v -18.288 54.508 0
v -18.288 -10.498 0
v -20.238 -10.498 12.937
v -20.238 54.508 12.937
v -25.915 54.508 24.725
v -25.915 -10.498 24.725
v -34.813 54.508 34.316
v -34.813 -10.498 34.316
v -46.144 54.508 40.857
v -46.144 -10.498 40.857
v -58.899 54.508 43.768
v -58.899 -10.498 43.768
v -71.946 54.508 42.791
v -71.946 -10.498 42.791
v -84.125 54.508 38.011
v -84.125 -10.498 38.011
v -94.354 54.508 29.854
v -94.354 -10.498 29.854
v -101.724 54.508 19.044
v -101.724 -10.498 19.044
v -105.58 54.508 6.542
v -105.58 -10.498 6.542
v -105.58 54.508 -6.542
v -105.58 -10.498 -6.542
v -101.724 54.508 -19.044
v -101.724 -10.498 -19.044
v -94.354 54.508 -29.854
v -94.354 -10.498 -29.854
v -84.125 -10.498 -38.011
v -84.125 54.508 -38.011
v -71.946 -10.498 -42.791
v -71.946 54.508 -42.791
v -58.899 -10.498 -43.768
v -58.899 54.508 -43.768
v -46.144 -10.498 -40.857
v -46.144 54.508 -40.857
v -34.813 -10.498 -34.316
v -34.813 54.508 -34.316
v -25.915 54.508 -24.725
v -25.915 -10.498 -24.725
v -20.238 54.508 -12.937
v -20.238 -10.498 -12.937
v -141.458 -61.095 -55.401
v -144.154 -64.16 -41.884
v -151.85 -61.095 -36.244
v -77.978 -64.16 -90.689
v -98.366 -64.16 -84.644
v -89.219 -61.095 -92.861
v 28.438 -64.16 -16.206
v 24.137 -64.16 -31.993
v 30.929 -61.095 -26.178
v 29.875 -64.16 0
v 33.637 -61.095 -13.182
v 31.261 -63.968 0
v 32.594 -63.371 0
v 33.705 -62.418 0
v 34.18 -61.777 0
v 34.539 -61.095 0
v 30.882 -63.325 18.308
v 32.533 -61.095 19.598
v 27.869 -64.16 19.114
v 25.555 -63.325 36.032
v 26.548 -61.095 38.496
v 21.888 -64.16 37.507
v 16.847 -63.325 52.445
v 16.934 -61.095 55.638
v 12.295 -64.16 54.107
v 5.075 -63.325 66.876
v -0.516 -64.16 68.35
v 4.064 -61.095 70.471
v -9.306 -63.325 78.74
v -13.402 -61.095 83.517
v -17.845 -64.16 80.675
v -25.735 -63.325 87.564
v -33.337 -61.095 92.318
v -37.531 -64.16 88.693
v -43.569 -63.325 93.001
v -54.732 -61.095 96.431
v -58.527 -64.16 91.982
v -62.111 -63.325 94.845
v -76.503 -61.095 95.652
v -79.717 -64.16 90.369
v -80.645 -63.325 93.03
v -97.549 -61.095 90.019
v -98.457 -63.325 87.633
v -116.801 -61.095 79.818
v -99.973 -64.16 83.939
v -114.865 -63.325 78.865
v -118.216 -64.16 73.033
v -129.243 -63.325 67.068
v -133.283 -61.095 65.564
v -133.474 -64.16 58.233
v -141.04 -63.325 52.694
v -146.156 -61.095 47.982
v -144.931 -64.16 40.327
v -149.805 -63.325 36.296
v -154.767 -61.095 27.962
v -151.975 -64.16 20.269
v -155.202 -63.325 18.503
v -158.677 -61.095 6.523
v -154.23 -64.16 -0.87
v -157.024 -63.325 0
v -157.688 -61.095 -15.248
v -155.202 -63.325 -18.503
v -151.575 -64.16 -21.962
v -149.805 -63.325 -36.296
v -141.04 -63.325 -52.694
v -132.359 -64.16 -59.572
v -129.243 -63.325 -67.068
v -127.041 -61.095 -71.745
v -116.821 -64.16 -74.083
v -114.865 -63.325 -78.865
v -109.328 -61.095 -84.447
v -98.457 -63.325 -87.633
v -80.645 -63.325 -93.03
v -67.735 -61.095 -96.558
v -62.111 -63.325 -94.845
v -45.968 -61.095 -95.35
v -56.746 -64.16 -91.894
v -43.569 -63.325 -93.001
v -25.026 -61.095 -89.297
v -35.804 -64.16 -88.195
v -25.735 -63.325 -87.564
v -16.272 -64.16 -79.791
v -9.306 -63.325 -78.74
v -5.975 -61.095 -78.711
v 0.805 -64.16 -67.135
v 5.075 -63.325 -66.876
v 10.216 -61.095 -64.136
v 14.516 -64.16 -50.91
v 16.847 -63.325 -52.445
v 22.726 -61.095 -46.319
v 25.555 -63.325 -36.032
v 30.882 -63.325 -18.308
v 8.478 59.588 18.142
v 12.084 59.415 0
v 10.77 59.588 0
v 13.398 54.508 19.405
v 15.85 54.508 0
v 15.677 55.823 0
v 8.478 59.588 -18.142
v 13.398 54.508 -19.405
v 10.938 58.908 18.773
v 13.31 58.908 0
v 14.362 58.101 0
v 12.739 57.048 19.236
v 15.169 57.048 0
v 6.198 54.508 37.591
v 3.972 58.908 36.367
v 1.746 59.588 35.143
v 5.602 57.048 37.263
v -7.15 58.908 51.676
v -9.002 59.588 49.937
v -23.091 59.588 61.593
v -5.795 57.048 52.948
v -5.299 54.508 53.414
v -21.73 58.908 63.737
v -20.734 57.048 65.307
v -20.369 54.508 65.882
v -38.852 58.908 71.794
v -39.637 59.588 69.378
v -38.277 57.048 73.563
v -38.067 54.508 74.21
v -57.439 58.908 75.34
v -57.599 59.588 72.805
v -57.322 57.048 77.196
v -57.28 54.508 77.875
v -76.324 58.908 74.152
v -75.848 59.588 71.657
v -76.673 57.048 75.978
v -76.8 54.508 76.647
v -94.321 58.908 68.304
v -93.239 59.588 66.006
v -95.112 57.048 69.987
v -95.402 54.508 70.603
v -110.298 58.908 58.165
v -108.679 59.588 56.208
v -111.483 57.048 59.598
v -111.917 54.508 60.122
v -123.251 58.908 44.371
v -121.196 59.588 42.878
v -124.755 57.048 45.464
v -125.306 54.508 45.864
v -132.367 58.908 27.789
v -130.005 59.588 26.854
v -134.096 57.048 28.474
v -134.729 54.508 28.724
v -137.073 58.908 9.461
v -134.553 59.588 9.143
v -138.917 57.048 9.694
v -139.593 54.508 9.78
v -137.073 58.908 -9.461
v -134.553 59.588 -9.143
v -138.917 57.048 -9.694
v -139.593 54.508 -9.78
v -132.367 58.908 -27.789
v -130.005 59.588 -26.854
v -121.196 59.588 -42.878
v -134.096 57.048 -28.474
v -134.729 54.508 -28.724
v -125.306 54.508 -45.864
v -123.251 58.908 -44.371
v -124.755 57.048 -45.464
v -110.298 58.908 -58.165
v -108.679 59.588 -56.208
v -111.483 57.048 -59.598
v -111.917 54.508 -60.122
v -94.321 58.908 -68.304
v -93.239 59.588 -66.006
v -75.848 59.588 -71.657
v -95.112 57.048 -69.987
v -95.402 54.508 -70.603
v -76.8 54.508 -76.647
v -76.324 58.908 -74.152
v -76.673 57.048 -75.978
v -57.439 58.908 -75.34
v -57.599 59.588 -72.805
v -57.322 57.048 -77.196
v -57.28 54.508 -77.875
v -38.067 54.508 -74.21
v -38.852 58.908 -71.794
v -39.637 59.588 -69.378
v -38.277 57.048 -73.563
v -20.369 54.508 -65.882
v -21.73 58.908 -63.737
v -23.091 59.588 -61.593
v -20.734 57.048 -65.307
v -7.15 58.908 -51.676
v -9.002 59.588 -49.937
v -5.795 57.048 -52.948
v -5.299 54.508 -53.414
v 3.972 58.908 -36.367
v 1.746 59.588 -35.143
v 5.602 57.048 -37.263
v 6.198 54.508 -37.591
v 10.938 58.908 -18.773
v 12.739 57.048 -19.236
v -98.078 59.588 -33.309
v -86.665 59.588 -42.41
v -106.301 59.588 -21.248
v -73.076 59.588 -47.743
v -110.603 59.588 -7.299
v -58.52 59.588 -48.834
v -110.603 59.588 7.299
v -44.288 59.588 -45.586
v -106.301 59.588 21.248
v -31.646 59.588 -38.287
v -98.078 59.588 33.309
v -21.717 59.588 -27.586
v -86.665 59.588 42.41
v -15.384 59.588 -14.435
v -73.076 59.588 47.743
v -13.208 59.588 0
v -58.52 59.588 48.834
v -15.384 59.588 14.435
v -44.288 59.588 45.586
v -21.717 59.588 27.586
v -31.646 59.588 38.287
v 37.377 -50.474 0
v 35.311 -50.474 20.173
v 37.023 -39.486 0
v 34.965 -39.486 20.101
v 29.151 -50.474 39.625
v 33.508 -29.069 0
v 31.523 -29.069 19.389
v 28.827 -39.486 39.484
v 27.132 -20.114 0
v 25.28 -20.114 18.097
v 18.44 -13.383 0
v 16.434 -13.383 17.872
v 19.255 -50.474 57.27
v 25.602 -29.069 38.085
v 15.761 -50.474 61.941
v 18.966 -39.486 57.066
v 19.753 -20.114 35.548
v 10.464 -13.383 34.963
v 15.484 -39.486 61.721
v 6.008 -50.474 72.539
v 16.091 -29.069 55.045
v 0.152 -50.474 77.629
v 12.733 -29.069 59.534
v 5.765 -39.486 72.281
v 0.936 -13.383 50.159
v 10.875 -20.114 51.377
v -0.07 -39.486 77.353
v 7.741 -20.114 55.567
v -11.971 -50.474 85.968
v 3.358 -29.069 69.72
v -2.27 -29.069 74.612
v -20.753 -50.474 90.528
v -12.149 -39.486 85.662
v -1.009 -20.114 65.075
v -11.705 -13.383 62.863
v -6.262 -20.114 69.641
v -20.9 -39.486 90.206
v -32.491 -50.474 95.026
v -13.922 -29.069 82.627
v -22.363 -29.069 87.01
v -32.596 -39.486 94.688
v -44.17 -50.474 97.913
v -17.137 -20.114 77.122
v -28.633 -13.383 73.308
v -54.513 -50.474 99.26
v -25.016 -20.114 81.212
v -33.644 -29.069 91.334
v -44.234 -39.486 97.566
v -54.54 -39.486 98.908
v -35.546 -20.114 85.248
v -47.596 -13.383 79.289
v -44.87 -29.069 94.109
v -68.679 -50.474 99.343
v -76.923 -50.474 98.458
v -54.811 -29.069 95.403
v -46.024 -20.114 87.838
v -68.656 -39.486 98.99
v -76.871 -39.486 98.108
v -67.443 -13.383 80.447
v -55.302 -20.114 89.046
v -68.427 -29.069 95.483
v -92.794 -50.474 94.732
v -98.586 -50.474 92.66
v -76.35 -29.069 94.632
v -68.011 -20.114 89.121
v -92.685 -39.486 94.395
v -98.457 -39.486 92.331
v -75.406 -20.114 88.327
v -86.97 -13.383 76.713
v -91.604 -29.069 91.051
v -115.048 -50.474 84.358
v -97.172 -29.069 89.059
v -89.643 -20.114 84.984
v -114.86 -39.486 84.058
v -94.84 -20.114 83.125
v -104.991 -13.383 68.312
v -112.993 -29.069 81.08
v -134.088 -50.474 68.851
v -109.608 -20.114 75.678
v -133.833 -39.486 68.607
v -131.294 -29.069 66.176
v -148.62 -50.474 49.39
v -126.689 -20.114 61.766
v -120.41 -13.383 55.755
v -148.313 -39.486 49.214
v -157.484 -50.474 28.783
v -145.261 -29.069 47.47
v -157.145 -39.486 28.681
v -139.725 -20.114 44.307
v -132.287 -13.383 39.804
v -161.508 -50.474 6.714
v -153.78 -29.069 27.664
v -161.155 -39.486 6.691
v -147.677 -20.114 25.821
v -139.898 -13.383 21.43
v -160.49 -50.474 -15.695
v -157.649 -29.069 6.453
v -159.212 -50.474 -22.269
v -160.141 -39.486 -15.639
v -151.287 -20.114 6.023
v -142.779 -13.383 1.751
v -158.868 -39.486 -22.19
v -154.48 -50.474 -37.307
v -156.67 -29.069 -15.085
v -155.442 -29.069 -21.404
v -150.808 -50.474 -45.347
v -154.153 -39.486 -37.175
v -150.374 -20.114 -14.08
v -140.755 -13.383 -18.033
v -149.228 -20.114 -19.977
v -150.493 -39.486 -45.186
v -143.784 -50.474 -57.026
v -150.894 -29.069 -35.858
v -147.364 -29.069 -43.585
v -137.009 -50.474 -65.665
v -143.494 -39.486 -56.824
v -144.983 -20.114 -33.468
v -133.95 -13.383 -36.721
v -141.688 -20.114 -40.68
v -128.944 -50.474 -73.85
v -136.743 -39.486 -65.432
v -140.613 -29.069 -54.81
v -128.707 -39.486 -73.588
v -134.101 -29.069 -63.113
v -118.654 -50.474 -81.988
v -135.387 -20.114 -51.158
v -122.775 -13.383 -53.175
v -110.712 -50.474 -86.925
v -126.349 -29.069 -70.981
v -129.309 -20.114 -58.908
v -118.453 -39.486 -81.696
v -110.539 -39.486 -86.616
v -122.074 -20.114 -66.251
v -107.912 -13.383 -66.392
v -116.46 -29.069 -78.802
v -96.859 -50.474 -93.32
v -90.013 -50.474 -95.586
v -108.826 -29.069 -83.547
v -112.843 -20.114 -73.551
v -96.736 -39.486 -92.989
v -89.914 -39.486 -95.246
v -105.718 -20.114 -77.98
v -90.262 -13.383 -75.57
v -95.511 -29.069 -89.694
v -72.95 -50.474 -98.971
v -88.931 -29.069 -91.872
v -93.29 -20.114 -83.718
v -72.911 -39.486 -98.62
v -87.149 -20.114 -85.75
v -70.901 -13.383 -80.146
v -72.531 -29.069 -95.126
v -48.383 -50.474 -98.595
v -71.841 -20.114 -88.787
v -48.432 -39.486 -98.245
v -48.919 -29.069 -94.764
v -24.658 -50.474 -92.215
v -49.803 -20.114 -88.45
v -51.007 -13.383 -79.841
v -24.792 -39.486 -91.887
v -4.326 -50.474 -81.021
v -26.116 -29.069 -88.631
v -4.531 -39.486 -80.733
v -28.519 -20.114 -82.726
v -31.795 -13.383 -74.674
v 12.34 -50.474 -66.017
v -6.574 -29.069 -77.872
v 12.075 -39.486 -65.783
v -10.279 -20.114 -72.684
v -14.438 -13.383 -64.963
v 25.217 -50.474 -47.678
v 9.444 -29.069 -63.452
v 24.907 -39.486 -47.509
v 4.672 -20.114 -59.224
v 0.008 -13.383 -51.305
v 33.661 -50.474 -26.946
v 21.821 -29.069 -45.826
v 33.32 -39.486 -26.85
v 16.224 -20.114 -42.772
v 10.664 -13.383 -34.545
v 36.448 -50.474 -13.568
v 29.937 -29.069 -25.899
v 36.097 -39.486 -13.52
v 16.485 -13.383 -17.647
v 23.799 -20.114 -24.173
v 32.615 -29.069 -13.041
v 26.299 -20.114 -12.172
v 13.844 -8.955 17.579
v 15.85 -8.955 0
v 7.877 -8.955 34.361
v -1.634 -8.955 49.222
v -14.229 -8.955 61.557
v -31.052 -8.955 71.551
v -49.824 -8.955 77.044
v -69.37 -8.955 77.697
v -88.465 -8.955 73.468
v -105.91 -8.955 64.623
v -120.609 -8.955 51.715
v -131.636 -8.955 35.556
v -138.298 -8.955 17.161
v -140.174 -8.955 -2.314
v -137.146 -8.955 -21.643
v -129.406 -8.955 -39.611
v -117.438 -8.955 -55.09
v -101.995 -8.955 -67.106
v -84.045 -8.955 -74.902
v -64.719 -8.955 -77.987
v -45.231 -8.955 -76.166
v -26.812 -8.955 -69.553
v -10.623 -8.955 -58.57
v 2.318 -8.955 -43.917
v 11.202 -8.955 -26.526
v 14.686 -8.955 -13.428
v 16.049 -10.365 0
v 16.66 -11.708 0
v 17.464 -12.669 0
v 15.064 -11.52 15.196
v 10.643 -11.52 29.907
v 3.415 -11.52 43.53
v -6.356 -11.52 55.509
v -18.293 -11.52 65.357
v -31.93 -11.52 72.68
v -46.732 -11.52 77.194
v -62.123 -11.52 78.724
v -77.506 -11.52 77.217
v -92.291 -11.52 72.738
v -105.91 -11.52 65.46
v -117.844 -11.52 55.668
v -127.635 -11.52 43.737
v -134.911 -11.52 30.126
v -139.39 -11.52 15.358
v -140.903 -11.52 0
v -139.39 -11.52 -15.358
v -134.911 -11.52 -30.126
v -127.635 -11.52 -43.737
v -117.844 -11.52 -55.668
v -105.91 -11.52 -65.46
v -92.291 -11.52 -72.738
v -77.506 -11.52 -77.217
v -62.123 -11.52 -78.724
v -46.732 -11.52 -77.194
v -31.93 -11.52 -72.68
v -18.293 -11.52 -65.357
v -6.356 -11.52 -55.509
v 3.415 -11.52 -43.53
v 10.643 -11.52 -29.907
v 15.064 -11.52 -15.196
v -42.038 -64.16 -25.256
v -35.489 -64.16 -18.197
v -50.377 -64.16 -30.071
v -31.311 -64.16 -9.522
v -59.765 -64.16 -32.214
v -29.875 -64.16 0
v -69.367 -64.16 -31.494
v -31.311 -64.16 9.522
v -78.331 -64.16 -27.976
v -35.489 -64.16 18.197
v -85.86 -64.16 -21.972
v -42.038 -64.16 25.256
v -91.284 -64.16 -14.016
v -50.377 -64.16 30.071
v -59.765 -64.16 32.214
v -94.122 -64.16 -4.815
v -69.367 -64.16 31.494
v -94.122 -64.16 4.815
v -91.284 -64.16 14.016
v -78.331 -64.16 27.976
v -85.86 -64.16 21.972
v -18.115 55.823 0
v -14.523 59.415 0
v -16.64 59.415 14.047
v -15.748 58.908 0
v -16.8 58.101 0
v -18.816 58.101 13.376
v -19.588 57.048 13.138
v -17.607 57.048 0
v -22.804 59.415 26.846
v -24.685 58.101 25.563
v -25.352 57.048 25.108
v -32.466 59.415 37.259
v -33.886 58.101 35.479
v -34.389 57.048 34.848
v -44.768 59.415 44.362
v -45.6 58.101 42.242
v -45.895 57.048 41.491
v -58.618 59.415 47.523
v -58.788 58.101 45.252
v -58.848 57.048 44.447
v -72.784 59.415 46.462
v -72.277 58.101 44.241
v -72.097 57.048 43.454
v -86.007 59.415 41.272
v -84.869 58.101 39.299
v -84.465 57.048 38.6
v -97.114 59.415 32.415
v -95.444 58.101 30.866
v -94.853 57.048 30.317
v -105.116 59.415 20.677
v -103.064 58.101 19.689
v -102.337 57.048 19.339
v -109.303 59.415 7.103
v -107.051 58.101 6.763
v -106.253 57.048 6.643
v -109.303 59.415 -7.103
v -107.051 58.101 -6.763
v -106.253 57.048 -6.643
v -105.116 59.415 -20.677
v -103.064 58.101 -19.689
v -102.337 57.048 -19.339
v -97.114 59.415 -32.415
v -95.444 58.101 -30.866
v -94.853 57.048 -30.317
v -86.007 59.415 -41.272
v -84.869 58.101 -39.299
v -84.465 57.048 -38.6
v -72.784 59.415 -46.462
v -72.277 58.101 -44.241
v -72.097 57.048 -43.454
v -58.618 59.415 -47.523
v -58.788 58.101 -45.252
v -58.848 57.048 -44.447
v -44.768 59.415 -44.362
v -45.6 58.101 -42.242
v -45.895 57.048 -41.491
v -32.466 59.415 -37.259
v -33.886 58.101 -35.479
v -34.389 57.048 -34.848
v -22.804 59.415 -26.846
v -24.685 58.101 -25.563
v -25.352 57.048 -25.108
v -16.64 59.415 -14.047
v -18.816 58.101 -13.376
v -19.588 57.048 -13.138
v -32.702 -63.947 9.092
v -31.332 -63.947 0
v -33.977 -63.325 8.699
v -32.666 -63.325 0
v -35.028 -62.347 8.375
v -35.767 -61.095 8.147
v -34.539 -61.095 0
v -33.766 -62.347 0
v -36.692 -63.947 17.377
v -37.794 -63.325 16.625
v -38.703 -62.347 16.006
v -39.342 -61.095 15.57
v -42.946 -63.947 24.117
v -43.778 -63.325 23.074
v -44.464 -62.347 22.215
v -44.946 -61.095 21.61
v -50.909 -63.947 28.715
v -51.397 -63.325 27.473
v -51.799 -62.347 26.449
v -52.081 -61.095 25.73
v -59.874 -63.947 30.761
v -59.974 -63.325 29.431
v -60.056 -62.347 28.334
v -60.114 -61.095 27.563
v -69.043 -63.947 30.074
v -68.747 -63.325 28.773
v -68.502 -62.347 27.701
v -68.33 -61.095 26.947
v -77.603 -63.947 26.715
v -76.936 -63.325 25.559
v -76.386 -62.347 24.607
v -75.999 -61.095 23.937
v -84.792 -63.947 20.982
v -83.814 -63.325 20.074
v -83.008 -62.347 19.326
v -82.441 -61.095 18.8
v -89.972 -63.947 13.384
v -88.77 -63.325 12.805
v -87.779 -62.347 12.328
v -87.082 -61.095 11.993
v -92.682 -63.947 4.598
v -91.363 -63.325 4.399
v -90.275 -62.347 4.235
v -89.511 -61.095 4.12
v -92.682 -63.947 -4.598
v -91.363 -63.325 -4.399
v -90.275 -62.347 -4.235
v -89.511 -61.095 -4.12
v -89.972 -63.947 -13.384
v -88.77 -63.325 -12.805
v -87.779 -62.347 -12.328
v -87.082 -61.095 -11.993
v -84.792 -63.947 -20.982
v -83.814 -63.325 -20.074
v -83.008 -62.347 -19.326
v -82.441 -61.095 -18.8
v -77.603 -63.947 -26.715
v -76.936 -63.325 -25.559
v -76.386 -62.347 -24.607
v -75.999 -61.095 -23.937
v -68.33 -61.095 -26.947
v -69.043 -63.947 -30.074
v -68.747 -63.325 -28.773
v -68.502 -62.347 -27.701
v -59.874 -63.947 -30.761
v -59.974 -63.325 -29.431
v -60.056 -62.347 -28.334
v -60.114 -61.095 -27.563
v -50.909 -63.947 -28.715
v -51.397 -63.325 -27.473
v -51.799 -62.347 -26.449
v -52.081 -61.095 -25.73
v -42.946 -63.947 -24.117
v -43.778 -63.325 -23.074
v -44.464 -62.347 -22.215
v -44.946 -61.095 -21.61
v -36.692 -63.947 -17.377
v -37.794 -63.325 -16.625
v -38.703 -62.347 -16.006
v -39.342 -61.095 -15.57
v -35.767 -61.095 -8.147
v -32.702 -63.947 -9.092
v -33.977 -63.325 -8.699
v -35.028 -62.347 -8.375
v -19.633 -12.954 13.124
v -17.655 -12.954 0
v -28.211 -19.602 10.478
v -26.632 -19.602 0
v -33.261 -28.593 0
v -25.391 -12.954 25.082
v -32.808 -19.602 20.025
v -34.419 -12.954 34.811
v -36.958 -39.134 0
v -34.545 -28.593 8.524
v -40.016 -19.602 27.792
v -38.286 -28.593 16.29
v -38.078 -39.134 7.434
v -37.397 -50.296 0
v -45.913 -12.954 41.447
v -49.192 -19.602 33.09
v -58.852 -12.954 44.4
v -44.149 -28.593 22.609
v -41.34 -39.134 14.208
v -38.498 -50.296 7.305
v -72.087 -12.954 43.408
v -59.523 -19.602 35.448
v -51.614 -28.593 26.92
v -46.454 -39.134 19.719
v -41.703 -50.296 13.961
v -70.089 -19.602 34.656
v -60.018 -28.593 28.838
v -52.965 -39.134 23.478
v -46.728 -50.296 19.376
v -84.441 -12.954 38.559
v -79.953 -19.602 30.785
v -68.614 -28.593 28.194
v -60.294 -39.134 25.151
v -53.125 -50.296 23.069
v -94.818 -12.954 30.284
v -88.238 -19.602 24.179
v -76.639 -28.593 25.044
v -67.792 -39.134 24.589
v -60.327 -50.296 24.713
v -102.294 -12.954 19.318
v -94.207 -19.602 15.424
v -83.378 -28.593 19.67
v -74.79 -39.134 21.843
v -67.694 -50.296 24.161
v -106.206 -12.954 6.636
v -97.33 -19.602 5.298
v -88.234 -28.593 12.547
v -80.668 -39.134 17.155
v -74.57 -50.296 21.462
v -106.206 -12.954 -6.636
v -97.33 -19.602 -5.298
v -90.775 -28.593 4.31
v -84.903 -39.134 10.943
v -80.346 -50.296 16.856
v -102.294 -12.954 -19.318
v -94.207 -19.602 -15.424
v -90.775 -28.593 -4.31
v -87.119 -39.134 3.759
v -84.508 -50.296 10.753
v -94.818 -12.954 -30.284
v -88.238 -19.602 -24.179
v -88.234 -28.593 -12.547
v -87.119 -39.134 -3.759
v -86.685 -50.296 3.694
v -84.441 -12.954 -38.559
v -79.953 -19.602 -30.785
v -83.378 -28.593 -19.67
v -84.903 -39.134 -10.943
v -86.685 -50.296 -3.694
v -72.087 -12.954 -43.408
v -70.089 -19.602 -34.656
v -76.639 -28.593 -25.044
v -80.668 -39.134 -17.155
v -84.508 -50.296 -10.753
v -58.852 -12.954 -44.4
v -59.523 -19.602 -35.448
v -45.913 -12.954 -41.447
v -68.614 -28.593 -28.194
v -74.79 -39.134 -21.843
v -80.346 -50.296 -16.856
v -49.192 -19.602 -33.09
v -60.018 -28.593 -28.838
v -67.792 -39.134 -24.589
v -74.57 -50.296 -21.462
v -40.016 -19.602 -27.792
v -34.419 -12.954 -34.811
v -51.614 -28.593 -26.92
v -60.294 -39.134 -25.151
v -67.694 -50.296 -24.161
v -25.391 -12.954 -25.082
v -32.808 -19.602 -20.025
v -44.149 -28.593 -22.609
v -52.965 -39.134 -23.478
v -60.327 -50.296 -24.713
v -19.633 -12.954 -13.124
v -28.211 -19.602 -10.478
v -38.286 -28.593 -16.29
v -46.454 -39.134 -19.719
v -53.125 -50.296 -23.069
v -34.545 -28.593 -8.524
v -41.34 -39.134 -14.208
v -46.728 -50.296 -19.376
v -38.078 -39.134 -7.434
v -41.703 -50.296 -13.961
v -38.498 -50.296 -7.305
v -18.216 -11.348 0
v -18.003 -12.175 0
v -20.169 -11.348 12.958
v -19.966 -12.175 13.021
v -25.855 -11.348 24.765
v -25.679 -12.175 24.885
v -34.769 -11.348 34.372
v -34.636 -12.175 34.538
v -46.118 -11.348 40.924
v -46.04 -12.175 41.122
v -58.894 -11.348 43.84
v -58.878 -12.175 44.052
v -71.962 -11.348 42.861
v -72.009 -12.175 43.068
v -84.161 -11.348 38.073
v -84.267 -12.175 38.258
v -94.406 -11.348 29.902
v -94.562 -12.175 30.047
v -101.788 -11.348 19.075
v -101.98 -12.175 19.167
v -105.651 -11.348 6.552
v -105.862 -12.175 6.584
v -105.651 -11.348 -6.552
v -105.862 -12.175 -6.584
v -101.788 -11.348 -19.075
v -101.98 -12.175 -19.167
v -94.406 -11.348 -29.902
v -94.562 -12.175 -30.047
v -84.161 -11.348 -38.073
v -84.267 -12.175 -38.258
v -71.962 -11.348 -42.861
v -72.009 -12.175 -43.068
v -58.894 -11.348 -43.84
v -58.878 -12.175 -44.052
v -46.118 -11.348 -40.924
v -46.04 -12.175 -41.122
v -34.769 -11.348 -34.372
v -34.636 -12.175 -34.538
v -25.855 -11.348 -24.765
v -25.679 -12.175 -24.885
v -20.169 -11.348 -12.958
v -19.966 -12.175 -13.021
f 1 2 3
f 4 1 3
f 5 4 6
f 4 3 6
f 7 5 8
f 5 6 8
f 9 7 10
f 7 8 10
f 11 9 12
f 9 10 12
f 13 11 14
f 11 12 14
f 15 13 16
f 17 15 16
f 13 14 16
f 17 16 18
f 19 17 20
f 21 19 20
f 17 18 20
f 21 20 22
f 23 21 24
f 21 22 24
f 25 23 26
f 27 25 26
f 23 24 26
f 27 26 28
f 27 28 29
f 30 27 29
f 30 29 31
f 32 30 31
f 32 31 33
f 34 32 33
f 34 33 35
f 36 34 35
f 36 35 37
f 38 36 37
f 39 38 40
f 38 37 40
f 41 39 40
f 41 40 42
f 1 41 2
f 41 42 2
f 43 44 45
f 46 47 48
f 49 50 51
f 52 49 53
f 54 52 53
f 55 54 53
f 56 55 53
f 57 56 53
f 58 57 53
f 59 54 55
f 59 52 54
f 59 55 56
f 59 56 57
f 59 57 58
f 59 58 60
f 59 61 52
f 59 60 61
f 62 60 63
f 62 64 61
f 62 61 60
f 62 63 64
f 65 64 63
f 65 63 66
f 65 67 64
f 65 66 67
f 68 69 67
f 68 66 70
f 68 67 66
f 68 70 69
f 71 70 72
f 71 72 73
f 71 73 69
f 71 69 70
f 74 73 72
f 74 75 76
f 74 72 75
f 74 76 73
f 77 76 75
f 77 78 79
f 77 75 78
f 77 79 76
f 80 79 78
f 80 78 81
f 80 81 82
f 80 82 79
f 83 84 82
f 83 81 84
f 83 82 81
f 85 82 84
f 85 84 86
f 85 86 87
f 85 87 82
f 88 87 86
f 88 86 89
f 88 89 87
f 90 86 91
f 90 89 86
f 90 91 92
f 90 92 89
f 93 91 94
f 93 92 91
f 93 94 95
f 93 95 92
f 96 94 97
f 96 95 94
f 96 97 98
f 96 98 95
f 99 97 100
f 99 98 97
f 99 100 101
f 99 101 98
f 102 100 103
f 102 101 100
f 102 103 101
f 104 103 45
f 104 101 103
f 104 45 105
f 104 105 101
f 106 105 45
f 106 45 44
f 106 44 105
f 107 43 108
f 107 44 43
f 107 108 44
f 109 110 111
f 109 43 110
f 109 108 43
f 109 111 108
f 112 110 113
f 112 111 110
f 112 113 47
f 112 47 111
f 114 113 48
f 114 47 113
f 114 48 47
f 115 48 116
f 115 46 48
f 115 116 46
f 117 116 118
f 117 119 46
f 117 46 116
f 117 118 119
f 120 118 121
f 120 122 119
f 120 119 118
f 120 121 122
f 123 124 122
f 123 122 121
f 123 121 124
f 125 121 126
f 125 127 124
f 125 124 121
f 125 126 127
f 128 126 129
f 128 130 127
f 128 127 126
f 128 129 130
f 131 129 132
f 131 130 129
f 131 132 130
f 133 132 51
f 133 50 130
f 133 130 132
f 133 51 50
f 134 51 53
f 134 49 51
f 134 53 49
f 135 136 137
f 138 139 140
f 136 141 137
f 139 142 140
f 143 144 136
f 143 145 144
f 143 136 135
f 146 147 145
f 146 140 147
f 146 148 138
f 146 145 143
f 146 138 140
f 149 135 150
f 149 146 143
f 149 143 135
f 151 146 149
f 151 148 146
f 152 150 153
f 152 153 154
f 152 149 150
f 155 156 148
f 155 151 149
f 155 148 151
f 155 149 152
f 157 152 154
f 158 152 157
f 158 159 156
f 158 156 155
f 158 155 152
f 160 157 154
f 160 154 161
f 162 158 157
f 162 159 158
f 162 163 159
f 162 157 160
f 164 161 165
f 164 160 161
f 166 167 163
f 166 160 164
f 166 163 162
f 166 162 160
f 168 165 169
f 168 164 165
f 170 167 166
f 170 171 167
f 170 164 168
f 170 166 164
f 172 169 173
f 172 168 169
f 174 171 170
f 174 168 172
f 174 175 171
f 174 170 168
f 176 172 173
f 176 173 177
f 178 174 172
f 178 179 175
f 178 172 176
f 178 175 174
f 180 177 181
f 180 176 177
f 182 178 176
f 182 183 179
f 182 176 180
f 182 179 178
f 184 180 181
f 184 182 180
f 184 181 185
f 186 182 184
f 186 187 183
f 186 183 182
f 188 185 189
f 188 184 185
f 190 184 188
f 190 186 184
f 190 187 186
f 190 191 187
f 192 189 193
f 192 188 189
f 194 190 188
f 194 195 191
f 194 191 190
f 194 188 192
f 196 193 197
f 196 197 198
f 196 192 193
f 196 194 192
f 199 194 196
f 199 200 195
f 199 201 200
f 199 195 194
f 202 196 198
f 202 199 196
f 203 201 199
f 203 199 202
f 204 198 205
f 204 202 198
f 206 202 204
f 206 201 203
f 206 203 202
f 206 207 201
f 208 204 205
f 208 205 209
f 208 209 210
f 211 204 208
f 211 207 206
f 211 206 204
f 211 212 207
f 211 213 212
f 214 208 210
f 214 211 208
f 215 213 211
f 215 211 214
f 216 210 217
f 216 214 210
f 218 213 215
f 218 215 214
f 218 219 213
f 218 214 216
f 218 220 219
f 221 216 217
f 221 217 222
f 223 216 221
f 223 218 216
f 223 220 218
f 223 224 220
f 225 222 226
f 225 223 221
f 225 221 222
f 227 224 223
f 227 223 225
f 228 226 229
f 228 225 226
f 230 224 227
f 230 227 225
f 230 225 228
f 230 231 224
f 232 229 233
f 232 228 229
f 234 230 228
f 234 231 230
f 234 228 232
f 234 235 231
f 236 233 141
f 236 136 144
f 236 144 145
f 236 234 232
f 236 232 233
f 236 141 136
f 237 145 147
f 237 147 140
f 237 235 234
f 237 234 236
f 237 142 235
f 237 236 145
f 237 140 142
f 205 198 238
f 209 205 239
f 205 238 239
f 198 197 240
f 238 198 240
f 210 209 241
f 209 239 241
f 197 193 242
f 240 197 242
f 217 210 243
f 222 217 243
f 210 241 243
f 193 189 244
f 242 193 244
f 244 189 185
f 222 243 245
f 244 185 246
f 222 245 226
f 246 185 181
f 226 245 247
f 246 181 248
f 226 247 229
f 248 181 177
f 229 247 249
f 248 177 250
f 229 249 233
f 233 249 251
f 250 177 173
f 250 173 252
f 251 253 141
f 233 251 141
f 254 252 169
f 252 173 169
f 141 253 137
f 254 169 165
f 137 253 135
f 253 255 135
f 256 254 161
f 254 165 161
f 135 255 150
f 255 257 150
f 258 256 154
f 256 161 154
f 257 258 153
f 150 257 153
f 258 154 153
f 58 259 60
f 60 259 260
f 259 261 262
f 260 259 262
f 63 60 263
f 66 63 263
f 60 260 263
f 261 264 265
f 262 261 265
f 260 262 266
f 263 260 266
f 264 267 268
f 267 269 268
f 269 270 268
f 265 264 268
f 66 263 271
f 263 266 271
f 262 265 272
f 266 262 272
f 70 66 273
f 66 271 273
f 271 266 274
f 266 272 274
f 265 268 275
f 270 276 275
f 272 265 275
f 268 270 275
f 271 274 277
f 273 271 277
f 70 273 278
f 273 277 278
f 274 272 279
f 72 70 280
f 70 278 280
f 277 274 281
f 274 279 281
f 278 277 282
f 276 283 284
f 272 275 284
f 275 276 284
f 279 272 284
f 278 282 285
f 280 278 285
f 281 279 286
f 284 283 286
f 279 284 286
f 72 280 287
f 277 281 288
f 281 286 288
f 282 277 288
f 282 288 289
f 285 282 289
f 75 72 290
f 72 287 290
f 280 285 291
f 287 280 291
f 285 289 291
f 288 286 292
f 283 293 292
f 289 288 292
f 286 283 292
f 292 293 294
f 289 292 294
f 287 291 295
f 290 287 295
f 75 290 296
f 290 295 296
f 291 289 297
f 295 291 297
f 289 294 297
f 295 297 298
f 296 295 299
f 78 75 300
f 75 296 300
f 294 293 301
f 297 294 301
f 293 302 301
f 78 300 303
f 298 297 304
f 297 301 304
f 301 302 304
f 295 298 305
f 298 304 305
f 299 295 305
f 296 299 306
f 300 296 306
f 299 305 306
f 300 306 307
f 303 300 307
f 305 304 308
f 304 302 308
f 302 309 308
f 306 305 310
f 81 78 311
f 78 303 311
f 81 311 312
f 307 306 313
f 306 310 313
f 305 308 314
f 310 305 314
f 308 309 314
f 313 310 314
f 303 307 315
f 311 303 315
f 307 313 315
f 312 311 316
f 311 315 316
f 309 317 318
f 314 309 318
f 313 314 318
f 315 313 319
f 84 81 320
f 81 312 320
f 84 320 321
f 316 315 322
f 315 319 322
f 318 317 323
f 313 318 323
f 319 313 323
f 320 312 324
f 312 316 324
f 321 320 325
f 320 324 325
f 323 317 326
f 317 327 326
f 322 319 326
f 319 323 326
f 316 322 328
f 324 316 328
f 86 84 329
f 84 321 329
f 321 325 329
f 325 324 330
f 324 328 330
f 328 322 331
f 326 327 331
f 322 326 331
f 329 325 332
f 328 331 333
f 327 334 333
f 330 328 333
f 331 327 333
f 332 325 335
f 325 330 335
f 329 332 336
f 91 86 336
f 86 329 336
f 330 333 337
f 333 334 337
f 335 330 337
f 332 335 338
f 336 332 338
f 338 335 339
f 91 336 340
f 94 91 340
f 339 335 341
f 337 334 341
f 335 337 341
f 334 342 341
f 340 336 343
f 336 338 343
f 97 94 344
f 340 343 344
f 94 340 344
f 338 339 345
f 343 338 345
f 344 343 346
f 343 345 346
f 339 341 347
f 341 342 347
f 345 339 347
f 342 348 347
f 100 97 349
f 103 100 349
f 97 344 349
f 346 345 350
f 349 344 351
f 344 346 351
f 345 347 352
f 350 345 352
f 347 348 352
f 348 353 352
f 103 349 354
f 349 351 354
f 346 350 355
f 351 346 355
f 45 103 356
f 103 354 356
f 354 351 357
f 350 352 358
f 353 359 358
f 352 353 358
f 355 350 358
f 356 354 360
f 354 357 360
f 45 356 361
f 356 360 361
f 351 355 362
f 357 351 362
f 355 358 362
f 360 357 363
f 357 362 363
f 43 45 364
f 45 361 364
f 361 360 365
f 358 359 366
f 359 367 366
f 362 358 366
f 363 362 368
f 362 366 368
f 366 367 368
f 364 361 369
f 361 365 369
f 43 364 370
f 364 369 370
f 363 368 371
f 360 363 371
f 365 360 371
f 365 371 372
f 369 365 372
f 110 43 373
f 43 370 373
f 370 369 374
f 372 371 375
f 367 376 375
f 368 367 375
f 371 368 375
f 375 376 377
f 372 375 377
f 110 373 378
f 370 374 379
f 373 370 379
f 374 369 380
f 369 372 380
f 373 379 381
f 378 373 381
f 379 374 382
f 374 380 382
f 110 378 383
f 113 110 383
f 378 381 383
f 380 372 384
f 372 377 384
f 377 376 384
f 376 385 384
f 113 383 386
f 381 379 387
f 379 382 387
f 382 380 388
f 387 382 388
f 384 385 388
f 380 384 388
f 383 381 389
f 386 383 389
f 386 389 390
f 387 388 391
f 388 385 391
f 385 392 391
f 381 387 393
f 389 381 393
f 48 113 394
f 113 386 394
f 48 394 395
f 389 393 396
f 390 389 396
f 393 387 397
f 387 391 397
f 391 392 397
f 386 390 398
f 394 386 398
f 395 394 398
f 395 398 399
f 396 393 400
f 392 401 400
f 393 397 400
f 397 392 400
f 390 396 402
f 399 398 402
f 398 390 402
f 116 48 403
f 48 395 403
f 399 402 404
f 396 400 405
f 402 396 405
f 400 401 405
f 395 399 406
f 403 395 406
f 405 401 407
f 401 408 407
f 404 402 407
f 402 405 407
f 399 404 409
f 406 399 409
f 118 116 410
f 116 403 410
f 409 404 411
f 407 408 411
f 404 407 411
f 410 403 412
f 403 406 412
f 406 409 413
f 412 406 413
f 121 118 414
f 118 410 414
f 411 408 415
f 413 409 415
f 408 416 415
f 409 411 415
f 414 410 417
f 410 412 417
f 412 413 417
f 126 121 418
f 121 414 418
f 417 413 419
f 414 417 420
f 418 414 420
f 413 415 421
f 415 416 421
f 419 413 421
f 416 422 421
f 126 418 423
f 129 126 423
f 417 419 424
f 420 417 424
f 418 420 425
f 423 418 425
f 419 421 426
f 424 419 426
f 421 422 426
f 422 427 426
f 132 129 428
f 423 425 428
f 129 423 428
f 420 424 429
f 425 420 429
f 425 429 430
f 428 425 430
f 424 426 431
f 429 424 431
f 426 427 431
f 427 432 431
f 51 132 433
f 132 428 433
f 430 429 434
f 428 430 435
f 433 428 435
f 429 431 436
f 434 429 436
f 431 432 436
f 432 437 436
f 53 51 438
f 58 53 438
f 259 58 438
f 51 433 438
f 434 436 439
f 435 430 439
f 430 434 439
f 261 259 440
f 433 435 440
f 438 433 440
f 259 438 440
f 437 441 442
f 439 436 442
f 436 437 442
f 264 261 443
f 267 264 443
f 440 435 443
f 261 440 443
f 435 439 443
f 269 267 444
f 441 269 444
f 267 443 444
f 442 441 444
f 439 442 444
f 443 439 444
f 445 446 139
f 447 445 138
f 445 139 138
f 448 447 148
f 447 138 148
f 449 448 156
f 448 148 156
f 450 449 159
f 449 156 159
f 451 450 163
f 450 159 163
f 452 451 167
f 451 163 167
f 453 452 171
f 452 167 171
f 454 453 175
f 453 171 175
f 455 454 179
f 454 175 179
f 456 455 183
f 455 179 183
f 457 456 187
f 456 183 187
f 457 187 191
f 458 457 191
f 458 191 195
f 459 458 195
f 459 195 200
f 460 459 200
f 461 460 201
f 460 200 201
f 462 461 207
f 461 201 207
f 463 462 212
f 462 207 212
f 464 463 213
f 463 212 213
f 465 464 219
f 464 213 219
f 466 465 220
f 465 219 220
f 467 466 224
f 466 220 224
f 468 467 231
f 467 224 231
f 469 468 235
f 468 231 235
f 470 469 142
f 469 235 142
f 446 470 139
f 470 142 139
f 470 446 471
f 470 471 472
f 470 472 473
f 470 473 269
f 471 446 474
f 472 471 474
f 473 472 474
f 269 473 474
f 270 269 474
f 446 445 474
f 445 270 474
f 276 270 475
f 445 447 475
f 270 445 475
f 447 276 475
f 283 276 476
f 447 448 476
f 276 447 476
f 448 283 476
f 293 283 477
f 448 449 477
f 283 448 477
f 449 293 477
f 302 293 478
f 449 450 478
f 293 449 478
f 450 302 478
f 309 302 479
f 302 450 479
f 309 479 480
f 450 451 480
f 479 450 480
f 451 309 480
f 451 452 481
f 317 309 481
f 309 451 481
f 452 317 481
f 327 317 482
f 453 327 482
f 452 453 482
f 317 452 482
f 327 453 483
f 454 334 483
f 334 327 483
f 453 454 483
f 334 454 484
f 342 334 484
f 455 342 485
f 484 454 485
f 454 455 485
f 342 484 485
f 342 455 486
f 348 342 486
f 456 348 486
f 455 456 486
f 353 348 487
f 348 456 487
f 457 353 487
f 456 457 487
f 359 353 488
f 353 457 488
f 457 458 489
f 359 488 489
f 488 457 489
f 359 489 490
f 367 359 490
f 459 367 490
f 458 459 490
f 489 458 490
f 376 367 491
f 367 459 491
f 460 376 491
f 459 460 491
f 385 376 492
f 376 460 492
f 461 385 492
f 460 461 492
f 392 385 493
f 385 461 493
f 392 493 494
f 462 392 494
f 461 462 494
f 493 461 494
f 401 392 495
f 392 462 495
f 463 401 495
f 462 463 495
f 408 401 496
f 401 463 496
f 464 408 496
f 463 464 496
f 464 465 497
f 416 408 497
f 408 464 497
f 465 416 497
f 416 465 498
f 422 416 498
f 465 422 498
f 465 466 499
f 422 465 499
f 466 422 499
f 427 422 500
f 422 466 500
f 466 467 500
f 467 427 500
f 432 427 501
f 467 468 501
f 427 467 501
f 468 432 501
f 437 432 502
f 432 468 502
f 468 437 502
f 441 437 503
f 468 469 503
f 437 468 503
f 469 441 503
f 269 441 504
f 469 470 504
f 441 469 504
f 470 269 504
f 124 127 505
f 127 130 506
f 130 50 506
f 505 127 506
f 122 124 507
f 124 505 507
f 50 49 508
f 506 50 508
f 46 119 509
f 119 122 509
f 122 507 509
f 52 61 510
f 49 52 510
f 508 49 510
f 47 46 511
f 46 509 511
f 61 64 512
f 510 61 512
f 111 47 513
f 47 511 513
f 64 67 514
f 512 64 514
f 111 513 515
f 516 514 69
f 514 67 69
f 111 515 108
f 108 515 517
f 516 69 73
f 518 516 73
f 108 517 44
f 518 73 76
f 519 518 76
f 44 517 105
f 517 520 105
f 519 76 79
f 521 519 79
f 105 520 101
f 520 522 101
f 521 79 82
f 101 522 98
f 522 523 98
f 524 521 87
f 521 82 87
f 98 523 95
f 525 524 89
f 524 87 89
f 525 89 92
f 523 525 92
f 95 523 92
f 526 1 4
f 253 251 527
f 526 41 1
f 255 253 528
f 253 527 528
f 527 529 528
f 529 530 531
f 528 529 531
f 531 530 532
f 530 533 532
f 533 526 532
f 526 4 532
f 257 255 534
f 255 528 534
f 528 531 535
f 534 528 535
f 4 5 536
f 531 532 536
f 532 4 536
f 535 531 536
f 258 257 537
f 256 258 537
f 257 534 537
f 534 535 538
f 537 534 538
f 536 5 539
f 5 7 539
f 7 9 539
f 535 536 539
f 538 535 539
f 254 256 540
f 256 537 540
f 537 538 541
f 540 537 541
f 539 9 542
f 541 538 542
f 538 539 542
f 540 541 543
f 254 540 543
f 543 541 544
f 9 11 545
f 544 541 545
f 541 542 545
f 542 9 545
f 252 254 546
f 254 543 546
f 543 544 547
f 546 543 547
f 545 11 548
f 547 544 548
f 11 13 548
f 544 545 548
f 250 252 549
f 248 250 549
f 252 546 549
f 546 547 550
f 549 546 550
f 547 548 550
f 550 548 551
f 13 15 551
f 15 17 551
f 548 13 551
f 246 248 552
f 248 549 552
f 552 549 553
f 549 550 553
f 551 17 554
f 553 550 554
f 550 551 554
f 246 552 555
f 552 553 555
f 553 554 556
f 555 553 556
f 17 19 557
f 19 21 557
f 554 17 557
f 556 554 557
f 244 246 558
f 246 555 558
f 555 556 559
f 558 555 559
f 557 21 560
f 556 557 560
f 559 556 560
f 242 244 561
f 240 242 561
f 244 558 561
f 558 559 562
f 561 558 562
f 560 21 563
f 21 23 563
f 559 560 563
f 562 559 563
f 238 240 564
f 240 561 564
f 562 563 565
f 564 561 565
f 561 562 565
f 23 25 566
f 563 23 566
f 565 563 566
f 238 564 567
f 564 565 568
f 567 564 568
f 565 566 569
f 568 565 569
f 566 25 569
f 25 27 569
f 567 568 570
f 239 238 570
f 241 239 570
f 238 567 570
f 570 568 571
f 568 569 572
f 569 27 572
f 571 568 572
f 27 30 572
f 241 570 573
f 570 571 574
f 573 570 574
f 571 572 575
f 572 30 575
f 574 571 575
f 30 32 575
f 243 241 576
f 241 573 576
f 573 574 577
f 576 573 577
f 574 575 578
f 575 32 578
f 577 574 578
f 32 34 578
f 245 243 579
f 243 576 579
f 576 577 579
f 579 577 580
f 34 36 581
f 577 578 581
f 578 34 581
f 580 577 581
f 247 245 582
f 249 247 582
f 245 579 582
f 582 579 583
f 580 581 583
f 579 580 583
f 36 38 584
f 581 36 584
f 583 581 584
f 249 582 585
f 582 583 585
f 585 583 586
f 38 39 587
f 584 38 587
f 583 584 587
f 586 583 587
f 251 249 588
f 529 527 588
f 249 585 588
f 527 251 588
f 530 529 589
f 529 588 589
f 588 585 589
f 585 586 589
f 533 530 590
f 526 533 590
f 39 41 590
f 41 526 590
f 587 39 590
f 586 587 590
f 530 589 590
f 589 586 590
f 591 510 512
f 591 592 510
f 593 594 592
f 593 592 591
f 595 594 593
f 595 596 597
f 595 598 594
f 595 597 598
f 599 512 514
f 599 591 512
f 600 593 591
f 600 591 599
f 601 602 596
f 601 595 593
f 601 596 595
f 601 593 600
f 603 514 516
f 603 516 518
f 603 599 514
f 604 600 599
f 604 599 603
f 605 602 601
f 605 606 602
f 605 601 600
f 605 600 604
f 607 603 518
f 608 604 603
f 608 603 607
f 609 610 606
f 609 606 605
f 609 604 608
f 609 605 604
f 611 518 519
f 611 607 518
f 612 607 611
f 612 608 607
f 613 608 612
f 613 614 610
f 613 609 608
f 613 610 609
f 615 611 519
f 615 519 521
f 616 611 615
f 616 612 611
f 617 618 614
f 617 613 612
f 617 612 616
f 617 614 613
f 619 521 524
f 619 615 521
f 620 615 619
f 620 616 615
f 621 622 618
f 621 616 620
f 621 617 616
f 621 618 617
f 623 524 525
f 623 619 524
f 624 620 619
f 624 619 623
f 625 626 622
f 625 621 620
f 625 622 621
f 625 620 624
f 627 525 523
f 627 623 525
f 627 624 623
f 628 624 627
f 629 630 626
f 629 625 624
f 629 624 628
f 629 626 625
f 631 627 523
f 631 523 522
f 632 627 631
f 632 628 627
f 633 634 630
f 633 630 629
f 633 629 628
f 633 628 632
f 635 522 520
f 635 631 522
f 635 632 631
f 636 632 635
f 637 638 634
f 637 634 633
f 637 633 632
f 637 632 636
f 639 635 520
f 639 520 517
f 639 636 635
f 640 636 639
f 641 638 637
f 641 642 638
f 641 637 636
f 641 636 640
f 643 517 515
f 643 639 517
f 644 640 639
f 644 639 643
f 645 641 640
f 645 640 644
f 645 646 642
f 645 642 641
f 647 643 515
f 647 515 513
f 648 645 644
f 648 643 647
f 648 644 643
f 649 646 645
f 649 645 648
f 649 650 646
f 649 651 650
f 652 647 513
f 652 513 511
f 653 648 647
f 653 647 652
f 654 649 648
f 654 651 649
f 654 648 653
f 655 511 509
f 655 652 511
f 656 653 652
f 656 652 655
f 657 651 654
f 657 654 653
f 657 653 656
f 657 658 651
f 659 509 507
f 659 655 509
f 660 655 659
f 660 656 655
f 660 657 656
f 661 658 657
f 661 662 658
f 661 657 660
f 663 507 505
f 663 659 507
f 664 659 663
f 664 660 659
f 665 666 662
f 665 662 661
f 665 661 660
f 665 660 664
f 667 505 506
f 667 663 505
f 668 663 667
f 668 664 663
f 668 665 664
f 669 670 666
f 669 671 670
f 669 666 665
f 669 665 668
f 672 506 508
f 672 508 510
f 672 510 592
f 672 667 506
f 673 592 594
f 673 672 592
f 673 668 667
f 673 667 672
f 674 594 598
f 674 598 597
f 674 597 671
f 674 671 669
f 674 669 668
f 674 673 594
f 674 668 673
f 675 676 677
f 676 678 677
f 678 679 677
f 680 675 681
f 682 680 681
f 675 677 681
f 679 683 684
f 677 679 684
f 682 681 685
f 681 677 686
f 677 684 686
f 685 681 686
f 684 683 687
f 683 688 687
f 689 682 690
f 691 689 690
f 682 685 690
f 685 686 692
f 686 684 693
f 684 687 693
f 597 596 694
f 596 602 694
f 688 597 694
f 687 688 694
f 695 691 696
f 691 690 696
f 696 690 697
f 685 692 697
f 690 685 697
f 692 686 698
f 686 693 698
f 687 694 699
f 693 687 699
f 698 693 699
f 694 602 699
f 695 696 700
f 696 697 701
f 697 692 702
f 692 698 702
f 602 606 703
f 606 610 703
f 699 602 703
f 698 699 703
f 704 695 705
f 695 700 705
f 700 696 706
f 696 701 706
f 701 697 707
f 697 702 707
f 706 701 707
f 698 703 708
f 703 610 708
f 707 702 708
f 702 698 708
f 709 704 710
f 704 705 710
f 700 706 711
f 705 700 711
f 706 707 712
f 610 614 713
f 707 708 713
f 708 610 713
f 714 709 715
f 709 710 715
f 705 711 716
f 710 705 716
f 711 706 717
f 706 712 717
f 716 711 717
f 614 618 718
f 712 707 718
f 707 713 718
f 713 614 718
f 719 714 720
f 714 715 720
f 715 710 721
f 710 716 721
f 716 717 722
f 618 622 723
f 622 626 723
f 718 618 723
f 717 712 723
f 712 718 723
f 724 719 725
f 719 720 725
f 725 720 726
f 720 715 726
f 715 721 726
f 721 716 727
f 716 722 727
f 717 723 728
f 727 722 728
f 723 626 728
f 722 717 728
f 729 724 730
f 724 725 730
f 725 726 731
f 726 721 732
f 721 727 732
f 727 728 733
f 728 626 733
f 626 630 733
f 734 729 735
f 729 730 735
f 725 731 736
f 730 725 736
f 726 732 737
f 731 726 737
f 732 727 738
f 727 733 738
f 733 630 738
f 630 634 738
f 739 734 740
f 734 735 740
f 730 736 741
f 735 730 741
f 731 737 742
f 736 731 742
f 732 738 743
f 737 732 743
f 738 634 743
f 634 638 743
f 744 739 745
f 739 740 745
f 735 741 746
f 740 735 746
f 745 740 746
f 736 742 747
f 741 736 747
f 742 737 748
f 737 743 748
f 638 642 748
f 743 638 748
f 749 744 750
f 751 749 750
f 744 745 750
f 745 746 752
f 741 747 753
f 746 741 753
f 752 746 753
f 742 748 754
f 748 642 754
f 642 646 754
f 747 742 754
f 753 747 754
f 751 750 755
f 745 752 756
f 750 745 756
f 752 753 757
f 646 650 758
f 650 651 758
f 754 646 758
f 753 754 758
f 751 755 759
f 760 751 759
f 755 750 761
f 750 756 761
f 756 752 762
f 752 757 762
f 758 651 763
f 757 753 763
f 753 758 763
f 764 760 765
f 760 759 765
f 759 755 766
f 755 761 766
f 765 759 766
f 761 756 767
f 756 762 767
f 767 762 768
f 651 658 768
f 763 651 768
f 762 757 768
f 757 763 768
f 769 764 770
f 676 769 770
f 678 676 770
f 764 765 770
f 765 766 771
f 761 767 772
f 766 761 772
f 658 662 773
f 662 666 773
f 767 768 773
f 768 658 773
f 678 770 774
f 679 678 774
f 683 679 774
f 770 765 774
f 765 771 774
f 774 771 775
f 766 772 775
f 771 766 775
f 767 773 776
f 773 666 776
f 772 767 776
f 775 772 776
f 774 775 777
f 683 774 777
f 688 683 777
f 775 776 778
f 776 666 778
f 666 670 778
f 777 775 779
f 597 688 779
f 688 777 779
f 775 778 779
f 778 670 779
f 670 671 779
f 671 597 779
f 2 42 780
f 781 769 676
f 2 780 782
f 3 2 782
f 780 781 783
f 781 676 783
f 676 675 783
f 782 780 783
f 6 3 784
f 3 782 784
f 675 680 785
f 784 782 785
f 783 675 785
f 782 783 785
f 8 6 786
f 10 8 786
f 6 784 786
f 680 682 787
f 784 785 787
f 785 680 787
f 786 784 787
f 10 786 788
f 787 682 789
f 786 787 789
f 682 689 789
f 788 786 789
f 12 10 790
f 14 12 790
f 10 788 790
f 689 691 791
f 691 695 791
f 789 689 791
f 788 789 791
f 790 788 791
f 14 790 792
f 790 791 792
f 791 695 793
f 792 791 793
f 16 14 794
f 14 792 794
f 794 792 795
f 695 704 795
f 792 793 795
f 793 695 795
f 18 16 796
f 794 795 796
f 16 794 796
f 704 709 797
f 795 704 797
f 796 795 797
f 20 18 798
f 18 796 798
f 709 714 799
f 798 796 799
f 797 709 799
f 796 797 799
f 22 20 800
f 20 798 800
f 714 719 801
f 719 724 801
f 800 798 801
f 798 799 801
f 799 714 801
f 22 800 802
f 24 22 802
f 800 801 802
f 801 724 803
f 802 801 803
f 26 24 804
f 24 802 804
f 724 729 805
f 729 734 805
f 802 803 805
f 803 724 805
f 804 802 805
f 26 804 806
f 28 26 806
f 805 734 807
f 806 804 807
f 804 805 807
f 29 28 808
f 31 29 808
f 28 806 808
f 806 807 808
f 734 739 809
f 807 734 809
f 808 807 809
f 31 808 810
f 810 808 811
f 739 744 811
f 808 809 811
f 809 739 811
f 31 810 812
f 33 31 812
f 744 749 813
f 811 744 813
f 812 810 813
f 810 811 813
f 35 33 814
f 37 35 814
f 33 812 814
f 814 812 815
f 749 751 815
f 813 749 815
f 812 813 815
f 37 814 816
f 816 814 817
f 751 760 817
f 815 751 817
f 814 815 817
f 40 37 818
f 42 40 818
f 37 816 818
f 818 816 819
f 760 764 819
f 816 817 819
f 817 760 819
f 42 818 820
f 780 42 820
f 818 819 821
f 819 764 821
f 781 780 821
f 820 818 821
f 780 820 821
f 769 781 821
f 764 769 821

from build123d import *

# Parameters (mm, degrees)
F2_R = 5.08
F3_R = 5.08


# Not quite as in the source:
# - a fillet or chamfer that OpenCascade refuses, or shapes differently, is made with other operations: its cross-section is extruded or revolved along the edge and cut away or added


with BuildPart() as f1:
    # F0 (on Top) → F1 (revolve)
    with BuildSketch(Plane.XY):
        Polygon((15.8496014774, 59.5883987844), (-18.2879995555, 59.5883987844), (-18.2879995555, -12.9540003836), (-17.6547473952, -12.9540003836), (15.8496014774, -12.9540003836), (15.8496014774, -12.0559275107), align=None)
        with BuildLine():
            ThreePointArc((33.0465635914, -64.1603991389), (35.7271287753, -34.3855398181), (15.8496014774, -12.0559275107))
            Line((15.8496014774, -12.0559275107), (15.8496014774, -12.9540003836))
            Line((15.8496014774, -12.9540003836), (-17.6547473952, -12.9540003836))
            ThreePointArc((-17.6547473952, -12.9540003836), (-36.0302588433, -35.3470835296), (-33.0465635914, -64.1603991389))
            Line((-33.0465635914, -64.1603991389), (33.0465635914, -64.1603991389))
        make_face()
    revolve(axis=Axis((-62.1792003512, -0.6096027792, 0), (0, -1, 0)))

    # F2
    f2_edges = [f1.edges().sort_by_distance(p)[0] for p in [
        (-157.404964, -64.160399, 0),
        (-140.208002, 59.588399, 0),
    ]]
    fillet(f2_edges, radius=F2_R)

    # F3
    f3_edges = [f1.edges().sort_by_distance(p)[0] for p in [
        (-140.208002, -12.055928, 0),
    ]]
    fillet(f3_edges, radius=F3_R)

    # F4: fillet of radius 5.08 on 3 edges, made by hand

    # F4_s1 → F4_t2 (revolve, cut)
    with BuildSketch(Plane.XY):
        with BuildLine():
            ThreePointArc((-13.2079995555, 59.5883987844), (-16.8001020039, 58.1005012328), (-18.2879995555, 54.5083987844))
            Line((-18.2879995555, 54.5083987844), (-18.2879995555, 59.5883987844))
            Line((-18.2879995555, 59.5883987844), (-13.2079995555, 59.5883987844))
        make_face()
    revolve(axis=Axis((-62.1792003512, 59.5883987844, 0), (0, -1, 0)), mode=Mode.SUBTRACT)

    # F4_s3 → F4_t4 (revolve, cut)
    with BuildSketch(Plane.XY):
        with BuildLine():
            ThreePointArc((-18.2879995555, -10.4978176442), (-18.1271396747, -11.7660686), (-17.6547473952, -12.9540003836))
            Line((-17.6547473952, -12.9540003836), (-18.2879995555, -12.9540003836))
            Line((-18.2879995555, -12.9540003836), (-18.2879995555, -10.4978176442))
        make_face()
    revolve(axis=Axis((-62.1792003512, -12.9540003836, 0), (0, -1, 0)), mode=Mode.SUBTRACT)

    # F4_s5 → F4_t6 (revolve, cut)
    with BuildSketch(Plane.XY):
        with BuildLine():
            ThreePointArc((-29.8753679594, -64.1603991389), (-32.6659019153, -63.3253161277), (-34.5389840999, -61.0946197064))
            ThreePointArc((-34.5389840999, -61.0946197064), (-33.8275230407, -62.6444253203), (-33.0465635914, -64.1603991389))
            Line((-33.0465635914, -64.1603991389), (-29.8753679594, -64.1603991389))
        make_face()
    revolve(axis=Axis((-62.1792003512, -64.1603991389, 0), (0, -1, 0)), mode=Mode.SUBTRACT)


solid = f1.part
